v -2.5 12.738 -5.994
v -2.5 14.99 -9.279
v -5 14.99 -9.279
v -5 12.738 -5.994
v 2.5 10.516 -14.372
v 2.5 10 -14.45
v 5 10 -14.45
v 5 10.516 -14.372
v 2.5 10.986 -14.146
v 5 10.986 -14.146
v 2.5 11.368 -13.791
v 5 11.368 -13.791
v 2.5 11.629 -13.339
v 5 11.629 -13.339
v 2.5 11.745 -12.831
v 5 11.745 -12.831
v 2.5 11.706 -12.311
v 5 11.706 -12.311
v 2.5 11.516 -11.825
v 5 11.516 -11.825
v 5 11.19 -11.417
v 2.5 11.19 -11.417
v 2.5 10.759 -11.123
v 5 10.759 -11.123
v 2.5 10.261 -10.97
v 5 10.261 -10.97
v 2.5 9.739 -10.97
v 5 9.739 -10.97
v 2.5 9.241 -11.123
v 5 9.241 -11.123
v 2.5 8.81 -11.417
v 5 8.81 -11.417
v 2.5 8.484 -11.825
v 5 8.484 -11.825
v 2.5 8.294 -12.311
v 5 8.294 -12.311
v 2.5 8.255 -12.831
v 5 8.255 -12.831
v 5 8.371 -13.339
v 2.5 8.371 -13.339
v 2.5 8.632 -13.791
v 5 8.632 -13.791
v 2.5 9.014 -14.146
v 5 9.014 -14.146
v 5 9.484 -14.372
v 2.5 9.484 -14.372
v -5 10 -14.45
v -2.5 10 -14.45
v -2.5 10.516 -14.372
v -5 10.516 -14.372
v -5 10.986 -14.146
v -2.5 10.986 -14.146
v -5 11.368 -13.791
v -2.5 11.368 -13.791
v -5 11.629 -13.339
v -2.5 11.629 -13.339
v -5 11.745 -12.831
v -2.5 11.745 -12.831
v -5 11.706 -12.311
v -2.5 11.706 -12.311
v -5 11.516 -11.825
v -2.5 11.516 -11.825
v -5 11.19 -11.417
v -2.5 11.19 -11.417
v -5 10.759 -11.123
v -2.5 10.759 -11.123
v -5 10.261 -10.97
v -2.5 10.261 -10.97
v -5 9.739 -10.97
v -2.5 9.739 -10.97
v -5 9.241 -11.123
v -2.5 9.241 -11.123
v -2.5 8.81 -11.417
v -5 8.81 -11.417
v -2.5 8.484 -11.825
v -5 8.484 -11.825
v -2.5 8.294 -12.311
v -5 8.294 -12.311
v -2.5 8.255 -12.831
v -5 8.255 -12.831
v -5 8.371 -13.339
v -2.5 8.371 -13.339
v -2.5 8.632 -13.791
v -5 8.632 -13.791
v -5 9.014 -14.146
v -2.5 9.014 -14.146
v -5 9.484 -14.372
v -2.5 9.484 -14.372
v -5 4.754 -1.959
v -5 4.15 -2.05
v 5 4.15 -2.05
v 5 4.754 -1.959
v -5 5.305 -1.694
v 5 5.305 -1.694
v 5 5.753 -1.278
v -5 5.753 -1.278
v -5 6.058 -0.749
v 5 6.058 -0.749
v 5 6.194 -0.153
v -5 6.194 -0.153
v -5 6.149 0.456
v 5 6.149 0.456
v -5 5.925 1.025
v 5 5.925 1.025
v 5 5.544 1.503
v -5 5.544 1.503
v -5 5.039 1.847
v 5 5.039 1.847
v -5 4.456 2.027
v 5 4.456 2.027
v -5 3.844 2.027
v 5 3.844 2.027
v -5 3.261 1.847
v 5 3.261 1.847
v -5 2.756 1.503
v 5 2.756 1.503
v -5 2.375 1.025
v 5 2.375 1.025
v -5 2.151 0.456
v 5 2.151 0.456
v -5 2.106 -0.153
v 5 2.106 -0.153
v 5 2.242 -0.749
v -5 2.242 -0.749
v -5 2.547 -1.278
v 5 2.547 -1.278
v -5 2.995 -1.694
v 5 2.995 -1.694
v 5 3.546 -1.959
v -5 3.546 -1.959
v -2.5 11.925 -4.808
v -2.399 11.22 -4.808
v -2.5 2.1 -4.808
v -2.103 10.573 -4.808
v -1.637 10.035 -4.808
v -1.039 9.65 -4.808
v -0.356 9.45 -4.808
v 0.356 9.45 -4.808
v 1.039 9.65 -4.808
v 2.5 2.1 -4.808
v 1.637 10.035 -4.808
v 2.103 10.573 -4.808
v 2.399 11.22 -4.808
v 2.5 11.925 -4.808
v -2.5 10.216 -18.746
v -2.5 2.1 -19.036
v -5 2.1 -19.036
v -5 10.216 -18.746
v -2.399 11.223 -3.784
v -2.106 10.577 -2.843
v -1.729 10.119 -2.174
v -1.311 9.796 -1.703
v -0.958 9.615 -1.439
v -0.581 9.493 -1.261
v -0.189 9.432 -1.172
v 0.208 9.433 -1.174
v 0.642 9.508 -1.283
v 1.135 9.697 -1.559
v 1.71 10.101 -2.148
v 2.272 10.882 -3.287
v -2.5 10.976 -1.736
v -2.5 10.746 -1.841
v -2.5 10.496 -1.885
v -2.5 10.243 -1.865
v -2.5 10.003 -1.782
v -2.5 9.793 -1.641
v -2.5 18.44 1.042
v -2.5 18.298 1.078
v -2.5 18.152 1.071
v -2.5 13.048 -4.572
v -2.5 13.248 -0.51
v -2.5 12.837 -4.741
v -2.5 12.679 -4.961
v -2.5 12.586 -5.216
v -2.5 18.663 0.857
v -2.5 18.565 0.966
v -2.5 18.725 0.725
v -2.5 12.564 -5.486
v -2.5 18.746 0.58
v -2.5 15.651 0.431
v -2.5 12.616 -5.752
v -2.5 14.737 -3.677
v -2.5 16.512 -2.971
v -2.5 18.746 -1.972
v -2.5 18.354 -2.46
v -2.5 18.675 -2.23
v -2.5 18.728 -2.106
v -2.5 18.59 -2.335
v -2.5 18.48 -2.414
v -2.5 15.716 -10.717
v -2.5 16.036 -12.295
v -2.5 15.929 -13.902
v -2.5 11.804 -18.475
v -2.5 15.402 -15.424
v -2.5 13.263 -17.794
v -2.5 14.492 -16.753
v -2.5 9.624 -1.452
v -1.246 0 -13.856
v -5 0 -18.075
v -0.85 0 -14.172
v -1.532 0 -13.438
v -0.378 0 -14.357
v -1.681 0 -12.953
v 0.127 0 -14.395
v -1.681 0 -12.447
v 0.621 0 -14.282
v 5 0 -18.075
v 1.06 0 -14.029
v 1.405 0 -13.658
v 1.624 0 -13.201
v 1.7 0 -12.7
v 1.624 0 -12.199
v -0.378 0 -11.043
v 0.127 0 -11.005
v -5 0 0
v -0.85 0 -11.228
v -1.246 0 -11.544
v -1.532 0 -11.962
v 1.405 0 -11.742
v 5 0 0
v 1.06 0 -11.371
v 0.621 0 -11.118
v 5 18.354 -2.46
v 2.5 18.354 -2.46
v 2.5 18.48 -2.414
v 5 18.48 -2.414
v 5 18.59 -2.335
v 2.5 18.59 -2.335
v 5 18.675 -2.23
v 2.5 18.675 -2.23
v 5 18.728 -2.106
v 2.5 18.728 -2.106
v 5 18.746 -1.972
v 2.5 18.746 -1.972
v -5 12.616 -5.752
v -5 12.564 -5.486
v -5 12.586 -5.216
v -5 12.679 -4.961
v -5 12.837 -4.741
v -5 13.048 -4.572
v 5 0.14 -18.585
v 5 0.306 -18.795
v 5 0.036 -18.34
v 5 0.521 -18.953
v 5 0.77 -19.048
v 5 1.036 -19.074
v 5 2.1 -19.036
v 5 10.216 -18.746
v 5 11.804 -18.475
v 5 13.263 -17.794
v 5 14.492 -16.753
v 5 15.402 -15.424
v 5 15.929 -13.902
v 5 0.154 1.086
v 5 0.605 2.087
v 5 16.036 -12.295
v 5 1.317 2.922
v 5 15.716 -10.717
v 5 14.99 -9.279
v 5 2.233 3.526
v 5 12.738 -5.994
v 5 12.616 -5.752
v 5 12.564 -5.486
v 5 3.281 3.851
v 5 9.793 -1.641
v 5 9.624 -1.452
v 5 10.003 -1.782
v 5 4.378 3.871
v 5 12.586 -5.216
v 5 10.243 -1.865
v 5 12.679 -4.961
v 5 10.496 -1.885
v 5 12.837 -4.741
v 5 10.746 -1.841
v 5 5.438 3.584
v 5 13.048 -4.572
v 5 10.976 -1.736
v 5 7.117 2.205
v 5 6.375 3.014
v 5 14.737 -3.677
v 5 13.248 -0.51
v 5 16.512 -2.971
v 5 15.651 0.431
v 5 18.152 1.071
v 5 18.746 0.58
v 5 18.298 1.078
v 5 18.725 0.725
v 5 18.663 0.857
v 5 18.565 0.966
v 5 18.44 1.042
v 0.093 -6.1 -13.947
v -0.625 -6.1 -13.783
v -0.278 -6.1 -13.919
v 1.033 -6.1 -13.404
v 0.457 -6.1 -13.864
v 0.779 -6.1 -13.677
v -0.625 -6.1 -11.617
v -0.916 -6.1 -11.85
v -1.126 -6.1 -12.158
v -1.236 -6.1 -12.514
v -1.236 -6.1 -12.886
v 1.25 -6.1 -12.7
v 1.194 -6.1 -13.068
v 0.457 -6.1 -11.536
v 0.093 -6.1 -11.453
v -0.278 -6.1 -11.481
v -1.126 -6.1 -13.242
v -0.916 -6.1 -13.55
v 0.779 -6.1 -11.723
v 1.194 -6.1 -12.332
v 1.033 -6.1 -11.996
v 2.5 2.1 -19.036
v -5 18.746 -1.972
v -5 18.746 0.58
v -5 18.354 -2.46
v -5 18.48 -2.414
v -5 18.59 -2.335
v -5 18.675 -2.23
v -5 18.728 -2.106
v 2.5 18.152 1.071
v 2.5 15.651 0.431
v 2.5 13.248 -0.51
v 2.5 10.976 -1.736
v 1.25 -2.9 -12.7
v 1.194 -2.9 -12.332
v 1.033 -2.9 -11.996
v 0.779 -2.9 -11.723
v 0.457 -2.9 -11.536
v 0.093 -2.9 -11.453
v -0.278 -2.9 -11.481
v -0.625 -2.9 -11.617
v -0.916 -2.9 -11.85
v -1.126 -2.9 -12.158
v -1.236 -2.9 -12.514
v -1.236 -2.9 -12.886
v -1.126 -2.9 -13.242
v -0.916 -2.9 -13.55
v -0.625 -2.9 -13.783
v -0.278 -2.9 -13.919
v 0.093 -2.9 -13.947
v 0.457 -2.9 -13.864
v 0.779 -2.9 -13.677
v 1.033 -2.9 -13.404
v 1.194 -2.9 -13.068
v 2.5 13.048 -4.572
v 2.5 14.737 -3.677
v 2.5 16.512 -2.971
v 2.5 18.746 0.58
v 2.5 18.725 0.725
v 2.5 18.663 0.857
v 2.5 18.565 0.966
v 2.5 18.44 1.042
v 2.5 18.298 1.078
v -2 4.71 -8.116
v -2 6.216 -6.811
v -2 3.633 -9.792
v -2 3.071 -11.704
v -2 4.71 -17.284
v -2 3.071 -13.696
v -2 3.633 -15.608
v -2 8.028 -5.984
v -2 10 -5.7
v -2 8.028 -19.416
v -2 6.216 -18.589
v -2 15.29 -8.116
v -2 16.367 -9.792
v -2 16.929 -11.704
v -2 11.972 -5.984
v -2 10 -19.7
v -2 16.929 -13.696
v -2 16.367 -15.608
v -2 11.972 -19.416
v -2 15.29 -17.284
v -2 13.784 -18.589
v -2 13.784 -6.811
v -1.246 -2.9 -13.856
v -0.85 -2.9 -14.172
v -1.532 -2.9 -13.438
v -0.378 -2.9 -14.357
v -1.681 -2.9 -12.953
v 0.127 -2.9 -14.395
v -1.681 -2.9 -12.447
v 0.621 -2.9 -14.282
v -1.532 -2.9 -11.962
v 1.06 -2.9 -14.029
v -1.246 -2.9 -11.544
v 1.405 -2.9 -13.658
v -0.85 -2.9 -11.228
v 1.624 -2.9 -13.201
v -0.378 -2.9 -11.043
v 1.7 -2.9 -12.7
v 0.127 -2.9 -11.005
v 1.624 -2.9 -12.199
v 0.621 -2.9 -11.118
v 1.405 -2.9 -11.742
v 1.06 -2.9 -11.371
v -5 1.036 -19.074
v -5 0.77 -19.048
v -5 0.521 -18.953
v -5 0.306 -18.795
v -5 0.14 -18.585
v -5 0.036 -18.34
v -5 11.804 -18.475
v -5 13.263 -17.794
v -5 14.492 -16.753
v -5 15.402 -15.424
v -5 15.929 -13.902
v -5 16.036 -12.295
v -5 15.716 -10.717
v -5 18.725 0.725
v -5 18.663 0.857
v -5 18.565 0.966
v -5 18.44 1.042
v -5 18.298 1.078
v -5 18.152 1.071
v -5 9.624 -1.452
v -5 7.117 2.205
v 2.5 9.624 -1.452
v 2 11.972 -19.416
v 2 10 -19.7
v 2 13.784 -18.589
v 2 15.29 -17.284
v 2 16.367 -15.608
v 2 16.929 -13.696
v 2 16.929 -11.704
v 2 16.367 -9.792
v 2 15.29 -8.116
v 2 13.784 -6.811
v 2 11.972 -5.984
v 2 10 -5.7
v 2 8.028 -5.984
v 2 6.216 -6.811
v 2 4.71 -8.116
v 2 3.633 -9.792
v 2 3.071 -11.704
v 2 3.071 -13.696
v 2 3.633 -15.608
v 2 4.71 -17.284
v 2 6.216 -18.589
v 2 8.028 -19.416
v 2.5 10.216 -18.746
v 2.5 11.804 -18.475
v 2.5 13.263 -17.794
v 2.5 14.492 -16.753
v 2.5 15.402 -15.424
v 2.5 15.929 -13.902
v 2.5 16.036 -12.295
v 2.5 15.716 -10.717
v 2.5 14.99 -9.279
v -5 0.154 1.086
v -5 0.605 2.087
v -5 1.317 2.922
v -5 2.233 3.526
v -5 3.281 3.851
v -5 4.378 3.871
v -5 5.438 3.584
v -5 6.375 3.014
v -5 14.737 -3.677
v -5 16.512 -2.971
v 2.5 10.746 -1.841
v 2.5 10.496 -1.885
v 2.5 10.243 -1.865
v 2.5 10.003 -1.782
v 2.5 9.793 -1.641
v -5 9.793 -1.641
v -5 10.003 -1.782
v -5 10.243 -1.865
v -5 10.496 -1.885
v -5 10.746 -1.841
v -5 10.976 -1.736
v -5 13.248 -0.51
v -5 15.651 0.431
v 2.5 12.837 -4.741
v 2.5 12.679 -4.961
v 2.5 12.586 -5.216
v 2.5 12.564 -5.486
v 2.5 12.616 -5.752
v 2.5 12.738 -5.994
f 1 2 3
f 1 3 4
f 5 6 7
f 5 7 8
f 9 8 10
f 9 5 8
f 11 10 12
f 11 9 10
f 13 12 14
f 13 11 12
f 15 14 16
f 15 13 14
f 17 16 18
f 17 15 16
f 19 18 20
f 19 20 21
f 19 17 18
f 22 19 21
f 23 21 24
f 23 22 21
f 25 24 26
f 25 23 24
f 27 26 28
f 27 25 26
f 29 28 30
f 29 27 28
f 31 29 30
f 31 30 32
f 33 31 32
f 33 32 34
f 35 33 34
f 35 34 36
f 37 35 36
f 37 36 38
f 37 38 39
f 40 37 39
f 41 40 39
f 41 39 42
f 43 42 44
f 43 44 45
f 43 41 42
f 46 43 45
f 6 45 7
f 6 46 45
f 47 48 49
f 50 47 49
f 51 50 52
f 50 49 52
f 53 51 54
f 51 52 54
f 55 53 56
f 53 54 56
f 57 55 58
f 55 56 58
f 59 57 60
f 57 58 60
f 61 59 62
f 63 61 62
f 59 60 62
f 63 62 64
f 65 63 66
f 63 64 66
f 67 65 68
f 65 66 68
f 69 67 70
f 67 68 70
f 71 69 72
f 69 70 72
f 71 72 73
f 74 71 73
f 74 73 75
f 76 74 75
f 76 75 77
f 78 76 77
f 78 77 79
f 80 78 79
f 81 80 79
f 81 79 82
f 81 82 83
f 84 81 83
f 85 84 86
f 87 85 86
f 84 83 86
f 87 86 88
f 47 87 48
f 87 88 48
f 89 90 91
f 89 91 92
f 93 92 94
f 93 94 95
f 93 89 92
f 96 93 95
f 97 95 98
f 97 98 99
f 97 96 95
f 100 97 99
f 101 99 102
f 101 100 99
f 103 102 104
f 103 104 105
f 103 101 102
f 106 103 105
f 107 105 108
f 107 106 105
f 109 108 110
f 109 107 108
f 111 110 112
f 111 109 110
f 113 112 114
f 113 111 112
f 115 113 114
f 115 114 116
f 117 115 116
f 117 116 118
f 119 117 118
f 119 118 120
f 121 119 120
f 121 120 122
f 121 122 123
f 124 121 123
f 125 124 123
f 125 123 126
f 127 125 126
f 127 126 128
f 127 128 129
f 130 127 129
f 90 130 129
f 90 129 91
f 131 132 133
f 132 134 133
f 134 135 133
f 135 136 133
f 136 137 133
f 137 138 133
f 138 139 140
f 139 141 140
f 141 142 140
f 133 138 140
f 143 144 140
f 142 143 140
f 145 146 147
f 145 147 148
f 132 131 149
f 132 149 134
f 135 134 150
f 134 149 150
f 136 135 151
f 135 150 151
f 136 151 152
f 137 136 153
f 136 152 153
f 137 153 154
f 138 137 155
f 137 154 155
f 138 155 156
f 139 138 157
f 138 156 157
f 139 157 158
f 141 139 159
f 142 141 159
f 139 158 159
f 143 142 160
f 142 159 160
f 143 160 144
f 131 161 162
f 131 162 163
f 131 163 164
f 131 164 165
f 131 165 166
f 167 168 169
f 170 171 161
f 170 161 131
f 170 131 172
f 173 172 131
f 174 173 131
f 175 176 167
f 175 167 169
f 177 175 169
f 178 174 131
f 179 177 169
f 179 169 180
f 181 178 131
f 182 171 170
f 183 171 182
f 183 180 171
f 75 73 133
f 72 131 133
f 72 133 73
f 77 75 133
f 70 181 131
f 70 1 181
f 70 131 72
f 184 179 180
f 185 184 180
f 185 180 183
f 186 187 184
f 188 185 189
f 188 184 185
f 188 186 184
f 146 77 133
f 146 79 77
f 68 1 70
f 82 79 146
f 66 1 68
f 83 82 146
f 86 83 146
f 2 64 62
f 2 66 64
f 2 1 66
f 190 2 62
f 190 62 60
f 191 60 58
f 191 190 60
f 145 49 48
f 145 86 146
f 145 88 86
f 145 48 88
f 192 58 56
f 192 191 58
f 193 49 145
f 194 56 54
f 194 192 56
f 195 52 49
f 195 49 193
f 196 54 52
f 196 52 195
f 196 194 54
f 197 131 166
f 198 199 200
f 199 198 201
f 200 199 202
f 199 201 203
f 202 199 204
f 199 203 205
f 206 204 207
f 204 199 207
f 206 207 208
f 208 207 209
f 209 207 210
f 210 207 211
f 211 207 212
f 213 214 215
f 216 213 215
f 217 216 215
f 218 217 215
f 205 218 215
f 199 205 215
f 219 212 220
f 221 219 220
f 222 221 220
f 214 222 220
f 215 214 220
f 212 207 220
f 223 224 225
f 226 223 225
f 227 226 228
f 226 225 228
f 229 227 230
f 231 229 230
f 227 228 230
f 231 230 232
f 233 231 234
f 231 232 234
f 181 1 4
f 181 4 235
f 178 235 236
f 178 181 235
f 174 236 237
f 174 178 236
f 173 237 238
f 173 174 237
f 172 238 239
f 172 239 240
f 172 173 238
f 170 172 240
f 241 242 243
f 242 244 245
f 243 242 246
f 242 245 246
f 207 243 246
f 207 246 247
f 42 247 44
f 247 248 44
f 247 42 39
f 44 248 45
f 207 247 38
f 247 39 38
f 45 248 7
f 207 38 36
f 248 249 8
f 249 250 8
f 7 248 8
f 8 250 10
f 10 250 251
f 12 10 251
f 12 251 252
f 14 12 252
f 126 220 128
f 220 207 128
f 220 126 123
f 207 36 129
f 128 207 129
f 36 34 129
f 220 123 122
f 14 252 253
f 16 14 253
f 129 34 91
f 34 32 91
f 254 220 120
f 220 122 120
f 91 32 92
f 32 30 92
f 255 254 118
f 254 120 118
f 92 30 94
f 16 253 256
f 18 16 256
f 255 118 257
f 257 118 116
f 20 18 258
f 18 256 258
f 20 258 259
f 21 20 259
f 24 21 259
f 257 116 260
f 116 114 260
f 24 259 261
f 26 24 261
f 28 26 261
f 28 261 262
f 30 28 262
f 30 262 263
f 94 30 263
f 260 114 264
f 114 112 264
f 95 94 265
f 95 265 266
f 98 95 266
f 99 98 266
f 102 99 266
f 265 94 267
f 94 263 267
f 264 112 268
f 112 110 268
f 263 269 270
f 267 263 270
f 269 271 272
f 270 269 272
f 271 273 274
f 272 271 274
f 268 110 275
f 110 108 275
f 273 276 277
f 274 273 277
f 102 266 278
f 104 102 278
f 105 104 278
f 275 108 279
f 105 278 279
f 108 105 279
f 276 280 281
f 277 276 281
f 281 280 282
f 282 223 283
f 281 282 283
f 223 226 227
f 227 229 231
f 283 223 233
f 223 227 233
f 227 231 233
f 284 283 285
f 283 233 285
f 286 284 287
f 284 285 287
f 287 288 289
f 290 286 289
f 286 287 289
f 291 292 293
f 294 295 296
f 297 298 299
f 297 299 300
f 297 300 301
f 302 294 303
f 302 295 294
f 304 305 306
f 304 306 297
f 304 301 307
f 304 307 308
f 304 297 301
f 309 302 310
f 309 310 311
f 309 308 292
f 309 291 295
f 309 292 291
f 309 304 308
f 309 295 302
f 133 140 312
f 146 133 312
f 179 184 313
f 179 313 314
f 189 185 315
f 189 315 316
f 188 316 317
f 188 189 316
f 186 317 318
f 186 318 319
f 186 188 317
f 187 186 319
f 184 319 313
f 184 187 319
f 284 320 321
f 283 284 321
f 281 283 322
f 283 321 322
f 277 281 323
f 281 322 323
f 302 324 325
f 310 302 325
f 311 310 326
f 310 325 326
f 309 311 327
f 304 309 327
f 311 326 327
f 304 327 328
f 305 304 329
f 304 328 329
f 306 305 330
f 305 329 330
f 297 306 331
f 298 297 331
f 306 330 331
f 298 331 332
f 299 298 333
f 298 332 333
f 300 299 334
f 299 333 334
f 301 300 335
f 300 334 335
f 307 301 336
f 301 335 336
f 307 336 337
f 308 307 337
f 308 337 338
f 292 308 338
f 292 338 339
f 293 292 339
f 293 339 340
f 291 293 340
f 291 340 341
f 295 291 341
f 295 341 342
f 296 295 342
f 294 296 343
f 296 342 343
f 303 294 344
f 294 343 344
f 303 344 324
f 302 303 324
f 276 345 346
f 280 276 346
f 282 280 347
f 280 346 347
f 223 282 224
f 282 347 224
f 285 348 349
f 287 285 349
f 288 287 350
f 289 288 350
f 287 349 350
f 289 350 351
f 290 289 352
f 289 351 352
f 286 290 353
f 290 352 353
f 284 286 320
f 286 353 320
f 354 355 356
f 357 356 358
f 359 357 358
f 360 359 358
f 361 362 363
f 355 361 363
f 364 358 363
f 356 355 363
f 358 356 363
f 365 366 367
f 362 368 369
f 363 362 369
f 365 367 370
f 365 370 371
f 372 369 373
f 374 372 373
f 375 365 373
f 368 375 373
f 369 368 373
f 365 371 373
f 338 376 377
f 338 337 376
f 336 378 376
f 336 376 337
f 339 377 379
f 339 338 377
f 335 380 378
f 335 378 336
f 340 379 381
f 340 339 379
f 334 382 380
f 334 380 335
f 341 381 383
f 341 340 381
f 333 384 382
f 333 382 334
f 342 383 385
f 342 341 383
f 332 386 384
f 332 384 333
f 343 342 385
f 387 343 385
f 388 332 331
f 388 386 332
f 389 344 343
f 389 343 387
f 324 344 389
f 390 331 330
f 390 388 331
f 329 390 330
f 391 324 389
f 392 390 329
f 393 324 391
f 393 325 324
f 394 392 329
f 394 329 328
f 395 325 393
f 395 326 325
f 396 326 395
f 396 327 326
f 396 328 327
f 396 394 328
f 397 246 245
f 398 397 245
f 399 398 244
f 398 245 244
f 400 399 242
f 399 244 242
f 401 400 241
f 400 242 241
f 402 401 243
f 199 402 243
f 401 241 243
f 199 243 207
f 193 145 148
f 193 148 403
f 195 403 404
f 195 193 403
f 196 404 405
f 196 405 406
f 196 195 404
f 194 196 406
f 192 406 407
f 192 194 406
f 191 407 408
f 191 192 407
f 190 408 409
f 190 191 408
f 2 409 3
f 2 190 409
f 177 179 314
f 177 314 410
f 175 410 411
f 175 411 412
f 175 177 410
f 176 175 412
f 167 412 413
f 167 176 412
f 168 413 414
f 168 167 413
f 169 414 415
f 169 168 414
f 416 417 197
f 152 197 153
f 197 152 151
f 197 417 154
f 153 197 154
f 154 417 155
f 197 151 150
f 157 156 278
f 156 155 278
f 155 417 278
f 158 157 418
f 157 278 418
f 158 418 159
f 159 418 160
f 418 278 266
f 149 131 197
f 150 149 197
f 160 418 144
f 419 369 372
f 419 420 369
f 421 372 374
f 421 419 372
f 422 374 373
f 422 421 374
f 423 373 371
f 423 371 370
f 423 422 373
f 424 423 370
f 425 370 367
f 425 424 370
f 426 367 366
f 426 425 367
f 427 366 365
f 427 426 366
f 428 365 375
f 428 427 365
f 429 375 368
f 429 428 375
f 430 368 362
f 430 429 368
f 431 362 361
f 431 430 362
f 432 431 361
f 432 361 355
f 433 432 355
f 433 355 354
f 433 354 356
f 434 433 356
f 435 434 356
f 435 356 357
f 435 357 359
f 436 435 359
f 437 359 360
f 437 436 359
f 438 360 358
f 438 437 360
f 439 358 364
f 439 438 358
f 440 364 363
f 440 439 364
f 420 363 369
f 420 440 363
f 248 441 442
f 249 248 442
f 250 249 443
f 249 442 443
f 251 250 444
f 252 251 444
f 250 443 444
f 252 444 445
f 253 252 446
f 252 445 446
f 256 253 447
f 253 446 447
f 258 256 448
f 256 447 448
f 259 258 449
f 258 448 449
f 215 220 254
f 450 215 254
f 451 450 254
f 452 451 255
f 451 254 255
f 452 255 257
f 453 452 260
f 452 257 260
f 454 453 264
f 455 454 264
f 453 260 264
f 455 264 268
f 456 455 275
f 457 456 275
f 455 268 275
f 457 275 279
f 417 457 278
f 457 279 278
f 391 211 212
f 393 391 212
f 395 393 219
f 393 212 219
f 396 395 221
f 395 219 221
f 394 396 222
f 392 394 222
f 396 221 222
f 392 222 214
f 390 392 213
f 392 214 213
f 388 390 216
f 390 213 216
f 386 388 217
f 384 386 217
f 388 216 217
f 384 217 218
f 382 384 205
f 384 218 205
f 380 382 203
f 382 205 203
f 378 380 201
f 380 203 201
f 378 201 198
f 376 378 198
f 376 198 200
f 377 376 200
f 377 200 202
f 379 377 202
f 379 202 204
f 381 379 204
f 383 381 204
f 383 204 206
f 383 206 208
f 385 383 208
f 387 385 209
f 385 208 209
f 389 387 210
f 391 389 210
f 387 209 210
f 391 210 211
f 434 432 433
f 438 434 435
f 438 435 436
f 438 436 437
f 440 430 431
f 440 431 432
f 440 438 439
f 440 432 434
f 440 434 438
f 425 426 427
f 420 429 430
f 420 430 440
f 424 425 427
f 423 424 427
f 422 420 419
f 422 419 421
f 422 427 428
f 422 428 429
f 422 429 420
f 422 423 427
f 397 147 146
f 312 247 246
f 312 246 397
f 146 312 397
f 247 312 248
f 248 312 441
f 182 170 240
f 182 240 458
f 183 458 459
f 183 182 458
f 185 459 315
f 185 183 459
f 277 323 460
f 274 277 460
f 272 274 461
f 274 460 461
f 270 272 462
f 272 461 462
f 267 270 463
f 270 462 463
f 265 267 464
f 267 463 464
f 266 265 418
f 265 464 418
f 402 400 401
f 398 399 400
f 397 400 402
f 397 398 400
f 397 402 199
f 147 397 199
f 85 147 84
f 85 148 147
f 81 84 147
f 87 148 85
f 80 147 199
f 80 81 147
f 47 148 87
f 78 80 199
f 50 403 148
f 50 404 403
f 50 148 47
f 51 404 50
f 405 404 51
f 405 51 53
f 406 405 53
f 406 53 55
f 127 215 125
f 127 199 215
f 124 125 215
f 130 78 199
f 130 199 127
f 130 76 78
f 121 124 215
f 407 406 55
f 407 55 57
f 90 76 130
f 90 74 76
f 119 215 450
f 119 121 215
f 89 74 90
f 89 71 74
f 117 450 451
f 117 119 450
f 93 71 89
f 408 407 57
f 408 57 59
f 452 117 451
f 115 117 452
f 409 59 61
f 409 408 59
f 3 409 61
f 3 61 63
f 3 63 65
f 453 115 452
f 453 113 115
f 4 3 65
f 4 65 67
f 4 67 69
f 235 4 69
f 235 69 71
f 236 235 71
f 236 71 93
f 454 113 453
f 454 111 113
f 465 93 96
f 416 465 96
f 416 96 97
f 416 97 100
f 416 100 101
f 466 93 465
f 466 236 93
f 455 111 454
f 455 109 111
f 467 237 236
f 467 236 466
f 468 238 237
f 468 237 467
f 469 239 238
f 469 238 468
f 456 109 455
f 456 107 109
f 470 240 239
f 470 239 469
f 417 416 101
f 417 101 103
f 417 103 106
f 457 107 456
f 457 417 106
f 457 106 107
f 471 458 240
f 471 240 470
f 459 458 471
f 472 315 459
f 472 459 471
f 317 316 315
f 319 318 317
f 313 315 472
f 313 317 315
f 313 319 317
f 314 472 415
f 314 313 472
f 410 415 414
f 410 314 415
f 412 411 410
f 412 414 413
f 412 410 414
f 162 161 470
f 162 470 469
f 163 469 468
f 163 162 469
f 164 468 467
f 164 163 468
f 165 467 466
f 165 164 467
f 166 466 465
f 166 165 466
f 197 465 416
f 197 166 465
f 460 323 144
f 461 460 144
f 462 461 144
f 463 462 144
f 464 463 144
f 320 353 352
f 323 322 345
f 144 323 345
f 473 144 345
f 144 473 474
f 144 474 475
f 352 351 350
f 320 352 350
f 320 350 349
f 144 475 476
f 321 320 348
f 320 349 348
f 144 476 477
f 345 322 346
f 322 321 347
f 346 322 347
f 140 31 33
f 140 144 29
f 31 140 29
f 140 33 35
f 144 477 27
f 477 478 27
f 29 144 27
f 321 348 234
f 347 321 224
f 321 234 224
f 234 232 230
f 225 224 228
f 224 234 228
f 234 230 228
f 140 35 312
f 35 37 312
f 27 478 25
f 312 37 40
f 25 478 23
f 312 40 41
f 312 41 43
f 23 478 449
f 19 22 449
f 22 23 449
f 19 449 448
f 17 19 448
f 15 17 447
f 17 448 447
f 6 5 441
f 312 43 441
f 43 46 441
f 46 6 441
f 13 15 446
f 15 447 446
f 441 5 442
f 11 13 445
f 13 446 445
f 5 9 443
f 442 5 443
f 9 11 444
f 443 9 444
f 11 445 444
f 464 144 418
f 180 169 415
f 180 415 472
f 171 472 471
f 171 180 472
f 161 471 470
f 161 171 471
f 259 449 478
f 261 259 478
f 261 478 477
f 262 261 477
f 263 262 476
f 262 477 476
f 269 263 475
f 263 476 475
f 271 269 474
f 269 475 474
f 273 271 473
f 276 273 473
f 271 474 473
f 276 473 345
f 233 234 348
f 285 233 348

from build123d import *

# Parameters (mm, degrees)
BOSS_EXTRUDE3_DEPTH      = 5
BOSS_EXTRUDE3_DEPTH_BACK = 5
SKETCH2_R                = 2.05
BOSS_EXTRUDE1_START      = 2.5
SKETCH1_R                = 2.05
SKETCH1_R_2              = 1.75
BOSS_EXTRUDE1_DEPTH      = 2.5
SKETCH4_R                = 2.5
CUT_EXTRUDE1_DEPTH       = 21
SKETCH6_R                = 1.7
BOSS_EXTRUDE4_DEPTH      = 2.9
SKETCH7_R                = 1.25
BOSS_EXTRUDE5_DEPTH      = 3.2
BOSS_EXTRUDE6_DEPTH      = 2
BOSS_EXTRUDE6_DEPTH_BACK = 2
SKETCH8_R                = 7


with BuildPart() as part:
    # Sketch2 → Boss-Extrude3 (new, two sides: drawn at the far end of the back side and taken through both)
    with BuildSketch(Plane(origin=(0, 0, 0), x_dir=(0, 0, -1), z_dir=(1, 0, 0)).offset(-BOSS_EXTRUDE3_DEPTH_BACK)):
        with BuildLine():
            Line((4.807685332, 11.924515372), (4.807685332, 2.1))
            Line((4.807685332, 2.1), (19.036259504, 2.1))
            Line((19.036259504, 2.1), (19.074303405, 1.035723438))
            ThreePointArc((19.074303405, 1.035723438), (18.794567787, 0.30563822), (18.074941691, 0))
            Line((18.074941691, 0), (0, 0))
            ThreePointArc((0, 0), (-3.725249554, 2.745653536), (-2.205245462, 7.116658585))
            Line((-2.205245462, 7.116658585), (4.807685332, 11.924515372))
        make_face()
        with Locations((0, 4.15)):
            Circle(SKETCH2_R, mode=Mode.SUBTRACT)
    extrude(amount=BOSS_EXTRUDE3_DEPTH + BOSS_EXTRUDE3_DEPTH_BACK)

    # Sketch1 → Boss-Extrude1 (add)
    with BuildSketch(Plane(origin=(0, 0, 0), x_dir=(0, 0, -1), z_dir=(1, 0, 0)).offset(BOSS_EXTRUDE1_START)):
        with BuildLine():
            Line((0, 0), (18.074941691, 0))
            ThreePointArc((18.074941691, 0), (18.794567787, 0.30563822), (19.074303405, 1.035723438))
            Line((19.074303405, 1.035723438), (18.746138371, 10.2161268))
            ThreePointArc((18.746138371, 10.2161268), (15.424009506, 15.402061848), (9.279042296, 14.989944728))
            Line((9.279042296, 14.989944728), (5.994198358, 12.737953415))
            ThreePointArc((5.994198358, 12.737953415), (5.215965086, 12.585638779), (4.571541427, 13.047769626))
            ThreePointArc((4.571541427, 13.047769626), (3.300176399, 15.61485789), (2.460196394, 18.353606653))
            ThreePointArc((2.460196394, 18.353606653), (2.285157974, 18.635892094), (1.971865395, 18.746215613))
            Line((1.971865395, 18.746215613), (-0.58043143, 18.746215613))
            ThreePointArc((-0.58043143, 18.746215613), (-0.965919929, 18.564647109), (-1.071438147, 18.151810083))
            ThreePointArc((-1.071438147, 18.151810083), (0.003024945, 14.435267981), (1.735735032, 10.976240389))
            ThreePointArc((1.735735032, 10.976240389), (1.864947174, 10.243059004), (1.451738268, 9.623777871))
            Line((1.451738268, 9.623777871), (-2.205245462, 7.116658585))
            ThreePointArc((-2.205245462, 7.116658585), (-3.725249554, 2.745653536), (0, 0))
        make_face()
        with Locations((0, 4.15)):
            Circle(SKETCH1_R, mode=Mode.SUBTRACT)
        with Locations((12.7, 10)):
            Circle(SKETCH1_R_2, mode=Mode.SUBTRACT)
    boss_extrude1 = extrude(amount=BOSS_EXTRUDE1_DEPTH)

    # Mirror2: Boss-Extrude1 across plane
    add(boss_extrude1.mirror(Plane(origin=(0, 0, 0), x_dir=(0, 0, 1), z_dir=(1, 0, 0))))

    # Sketch4 → Cut-Extrude1 (cut)
    with BuildSketch(Plane.XY):
        with Locations((0, 11.924515372)):
            Circle(SKETCH4_R)
    extrude(amount=-CUT_EXTRUDE1_DEPTH, mode=Mode.SUBTRACT)

    # Sketch6 → Boss-Extrude4 (add)
    with BuildSketch(Plane.XZ):
        with Locations((0, -12.7)):
            Circle(SKETCH6_R)
    extrude(amount=BOSS_EXTRUDE4_DEPTH)

    # Sketch7 → Boss-Extrude5 (add)
    with BuildSketch(Plane.XZ.offset(2.9)):
        with Locations((0, -12.7)):
            Circle(SKETCH7_R)
    extrude(amount=BOSS_EXTRUDE5_DEPTH)


with BuildPart() as body_2:
    # Sketch8 → Boss-Extrude6 (new, two sides: drawn at the far end of the back side and taken through both)
    with BuildSketch(Plane(origin=(0, 0, 0), x_dir=(0, 0, -1), z_dir=(1, 0, 0)).offset(-BOSS_EXTRUDE6_DEPTH_BACK)):
        with Locations((12.7, 10)):
            Circle(SKETCH8_R)
    extrude(amount=BOSS_EXTRUDE6_DEPTH + BOSS_EXTRUDE6_DEPTH_BACK)


solid = Compound([part.part, body_2.part])
